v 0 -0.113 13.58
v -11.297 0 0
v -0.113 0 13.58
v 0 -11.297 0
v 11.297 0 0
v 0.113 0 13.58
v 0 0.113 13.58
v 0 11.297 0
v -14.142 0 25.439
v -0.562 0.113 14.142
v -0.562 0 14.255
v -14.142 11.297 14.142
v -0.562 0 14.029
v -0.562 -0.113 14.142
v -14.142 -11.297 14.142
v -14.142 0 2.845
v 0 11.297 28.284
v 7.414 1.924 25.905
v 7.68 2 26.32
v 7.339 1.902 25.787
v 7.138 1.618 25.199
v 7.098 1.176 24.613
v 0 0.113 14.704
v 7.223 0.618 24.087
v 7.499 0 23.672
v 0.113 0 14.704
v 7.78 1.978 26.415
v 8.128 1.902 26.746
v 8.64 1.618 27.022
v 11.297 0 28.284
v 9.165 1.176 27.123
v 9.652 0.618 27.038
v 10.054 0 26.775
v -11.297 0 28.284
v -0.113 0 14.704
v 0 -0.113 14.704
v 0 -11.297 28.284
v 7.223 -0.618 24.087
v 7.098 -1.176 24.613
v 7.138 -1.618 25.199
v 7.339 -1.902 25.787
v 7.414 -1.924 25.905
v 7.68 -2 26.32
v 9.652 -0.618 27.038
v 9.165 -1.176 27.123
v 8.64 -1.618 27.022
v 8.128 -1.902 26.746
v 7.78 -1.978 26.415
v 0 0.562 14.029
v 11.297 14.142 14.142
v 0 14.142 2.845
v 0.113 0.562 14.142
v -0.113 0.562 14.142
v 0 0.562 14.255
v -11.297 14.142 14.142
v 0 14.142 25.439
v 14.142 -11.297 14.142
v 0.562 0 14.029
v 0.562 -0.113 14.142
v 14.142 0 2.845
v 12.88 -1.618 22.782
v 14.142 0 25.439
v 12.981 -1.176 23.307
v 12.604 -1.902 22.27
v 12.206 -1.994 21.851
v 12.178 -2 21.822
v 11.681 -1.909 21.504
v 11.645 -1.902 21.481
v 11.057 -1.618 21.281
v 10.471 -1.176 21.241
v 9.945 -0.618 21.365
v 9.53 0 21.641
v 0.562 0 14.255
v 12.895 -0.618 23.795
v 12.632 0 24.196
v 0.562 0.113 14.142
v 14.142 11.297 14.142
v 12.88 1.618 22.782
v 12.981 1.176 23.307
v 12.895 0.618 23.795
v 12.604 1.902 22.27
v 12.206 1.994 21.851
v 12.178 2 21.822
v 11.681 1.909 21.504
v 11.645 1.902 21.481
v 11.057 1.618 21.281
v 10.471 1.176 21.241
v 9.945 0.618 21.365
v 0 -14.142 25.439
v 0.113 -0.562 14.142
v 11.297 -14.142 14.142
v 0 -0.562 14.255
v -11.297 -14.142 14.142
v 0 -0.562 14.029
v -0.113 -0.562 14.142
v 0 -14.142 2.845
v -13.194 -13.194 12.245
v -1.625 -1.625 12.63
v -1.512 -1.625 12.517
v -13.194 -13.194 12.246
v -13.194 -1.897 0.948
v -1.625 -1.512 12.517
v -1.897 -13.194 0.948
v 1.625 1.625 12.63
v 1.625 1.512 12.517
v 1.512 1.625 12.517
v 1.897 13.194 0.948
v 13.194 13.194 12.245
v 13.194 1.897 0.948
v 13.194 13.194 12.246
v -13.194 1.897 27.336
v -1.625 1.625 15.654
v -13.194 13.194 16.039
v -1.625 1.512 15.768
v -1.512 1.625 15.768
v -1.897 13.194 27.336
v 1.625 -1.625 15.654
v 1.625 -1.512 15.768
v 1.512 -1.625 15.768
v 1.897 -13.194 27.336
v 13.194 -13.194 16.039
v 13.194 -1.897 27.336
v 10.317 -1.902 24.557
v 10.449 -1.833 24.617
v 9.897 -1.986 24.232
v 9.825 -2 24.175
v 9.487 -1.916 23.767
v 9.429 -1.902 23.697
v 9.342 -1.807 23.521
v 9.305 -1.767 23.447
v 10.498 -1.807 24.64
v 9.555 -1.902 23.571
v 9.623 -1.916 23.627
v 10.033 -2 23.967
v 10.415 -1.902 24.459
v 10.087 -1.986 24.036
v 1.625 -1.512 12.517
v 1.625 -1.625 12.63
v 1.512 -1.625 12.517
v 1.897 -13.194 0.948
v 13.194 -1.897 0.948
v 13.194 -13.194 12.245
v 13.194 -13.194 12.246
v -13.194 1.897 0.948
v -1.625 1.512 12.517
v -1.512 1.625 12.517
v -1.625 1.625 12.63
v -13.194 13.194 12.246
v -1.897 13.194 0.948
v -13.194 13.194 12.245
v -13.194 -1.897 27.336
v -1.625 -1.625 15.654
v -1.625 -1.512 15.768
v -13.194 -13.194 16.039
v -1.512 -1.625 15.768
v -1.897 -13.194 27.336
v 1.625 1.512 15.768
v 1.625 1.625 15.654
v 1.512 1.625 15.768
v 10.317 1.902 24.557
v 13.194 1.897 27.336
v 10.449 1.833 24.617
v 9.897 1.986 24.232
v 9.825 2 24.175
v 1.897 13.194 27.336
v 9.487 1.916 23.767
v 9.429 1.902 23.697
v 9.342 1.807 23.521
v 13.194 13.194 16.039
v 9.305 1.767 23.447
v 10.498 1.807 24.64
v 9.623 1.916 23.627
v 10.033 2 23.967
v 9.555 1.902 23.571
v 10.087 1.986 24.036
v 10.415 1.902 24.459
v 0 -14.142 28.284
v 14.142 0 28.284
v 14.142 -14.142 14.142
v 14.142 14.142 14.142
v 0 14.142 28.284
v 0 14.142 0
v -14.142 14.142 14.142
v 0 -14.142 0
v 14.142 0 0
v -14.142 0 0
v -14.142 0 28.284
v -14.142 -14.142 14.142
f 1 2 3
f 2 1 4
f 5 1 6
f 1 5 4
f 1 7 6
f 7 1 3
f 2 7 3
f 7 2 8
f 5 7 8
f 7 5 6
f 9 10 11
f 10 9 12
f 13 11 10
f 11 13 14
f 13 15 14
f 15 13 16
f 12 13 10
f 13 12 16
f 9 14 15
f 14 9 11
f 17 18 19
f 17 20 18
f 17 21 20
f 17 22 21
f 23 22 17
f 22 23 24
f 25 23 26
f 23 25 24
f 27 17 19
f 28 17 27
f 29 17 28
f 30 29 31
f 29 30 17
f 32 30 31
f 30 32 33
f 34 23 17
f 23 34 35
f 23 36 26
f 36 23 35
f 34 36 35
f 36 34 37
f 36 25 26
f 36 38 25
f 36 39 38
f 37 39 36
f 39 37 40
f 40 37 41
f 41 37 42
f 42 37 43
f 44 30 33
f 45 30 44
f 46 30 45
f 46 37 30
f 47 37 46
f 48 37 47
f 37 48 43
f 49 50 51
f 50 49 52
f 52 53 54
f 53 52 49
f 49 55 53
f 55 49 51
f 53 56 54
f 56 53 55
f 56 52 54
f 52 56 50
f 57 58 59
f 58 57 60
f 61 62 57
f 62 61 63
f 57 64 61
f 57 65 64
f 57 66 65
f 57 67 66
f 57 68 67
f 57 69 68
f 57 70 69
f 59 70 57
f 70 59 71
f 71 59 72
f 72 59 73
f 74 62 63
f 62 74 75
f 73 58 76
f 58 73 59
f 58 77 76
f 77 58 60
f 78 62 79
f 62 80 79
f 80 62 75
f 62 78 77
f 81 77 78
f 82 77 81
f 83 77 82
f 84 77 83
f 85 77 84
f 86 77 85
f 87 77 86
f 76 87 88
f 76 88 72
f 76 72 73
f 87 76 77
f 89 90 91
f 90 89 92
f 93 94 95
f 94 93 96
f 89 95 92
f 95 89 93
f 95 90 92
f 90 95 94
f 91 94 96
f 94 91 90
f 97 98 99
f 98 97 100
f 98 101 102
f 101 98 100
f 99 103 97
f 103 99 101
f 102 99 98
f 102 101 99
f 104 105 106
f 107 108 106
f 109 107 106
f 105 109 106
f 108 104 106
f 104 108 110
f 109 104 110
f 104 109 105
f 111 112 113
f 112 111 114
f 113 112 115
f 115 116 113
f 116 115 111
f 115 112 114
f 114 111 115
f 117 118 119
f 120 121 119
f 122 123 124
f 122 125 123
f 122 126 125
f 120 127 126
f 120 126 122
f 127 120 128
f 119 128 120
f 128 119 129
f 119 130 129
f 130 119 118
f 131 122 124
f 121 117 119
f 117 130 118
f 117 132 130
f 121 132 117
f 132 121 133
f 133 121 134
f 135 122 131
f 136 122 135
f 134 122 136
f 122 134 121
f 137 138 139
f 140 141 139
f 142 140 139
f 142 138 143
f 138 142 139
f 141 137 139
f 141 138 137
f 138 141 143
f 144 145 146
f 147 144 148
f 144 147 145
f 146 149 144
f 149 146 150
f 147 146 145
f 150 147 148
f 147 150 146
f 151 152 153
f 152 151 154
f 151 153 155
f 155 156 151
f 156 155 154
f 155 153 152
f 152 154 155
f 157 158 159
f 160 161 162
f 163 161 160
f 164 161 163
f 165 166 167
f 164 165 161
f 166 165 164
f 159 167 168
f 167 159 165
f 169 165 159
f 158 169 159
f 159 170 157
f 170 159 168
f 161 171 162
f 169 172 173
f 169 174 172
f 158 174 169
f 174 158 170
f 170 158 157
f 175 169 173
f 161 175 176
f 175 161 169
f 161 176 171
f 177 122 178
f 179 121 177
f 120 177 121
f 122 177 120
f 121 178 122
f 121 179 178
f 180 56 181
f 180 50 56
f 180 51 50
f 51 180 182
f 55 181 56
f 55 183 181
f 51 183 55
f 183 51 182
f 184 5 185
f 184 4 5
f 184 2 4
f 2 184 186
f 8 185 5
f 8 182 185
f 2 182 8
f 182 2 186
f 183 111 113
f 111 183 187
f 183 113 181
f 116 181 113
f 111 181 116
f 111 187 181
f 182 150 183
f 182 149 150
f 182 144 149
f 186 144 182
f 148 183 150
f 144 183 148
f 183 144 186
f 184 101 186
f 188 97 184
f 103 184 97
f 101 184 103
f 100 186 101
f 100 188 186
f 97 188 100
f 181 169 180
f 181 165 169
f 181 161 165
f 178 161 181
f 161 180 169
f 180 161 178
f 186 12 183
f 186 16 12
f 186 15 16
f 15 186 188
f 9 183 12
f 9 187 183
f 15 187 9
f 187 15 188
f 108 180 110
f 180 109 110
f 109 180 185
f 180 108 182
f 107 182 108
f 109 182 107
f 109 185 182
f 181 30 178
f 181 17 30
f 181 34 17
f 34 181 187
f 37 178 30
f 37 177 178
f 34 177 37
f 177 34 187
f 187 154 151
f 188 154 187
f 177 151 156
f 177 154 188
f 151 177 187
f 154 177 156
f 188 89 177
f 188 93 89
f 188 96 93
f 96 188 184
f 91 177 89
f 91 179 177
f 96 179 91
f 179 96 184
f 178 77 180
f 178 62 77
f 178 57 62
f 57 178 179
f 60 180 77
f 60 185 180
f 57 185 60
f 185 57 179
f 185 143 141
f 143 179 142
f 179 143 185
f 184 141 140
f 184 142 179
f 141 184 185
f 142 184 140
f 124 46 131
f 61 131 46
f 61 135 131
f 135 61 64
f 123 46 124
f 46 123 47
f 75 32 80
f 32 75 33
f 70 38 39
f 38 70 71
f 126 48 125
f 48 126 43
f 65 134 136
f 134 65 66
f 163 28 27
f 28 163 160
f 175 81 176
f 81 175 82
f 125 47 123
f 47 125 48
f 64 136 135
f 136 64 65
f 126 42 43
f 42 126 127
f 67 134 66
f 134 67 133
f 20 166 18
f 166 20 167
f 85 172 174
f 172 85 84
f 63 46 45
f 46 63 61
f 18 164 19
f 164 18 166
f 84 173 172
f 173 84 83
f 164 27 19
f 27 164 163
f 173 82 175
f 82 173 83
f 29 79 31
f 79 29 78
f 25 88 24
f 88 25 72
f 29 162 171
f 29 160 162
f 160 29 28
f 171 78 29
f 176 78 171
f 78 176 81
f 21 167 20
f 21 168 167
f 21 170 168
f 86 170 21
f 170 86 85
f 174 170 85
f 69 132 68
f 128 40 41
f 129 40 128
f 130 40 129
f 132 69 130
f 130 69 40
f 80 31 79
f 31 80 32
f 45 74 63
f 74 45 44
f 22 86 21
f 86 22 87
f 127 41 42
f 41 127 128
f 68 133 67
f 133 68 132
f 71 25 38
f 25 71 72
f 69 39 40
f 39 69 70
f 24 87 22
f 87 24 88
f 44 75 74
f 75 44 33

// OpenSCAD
// Cuboctahedron savonnette

version = 1;
// Cuboctahedron

// base coordinates
// source:  http://dmccooey.com/polyhedra/Cuboctahedron.txt
// generated by  http://kitwallace.co.uk/3d/solid-to-scad.xq
Name = "Cuboctahedron";
// 4 sided faces = 6
// 3 sided faces = 8
C0 = 0.7071067811865475244008443621048;
points = [
[ C0, 0.0,  C0],
[ C0, 0.0, -C0],
[-C0, 0.0,  C0],
[-C0, 0.0, -C0],
[ C0,  C0, 0.0],
[ C0, -C0, 0.0],
[-C0,  C0, 0.0],
[-C0, -C0, 0.0],
[0.0,  C0,  C0],
[0.0,  C0, -C0],
[0.0, -C0,  C0],
[0.0, -C0, -C0]];
faces = [
[  4 ,  1,  5,  0],
[ 10 ,  2,  8,  0],
[  3 ,  6,  2,  7],
[ 10 ,  5, 11,  7],
[  3 , 11,  1,  9],
[  4 ,  8,  6,  9],
[  8 ,  4,  0],
[ 11 ,  5,  1],
[ 10 ,  7,  2],
[  9 ,  6,  3],
[  9 ,  1,  4],
[ 10 ,  0,  5],
[  8 ,  2,  6],
[ 11 ,  3,  7]];
edges = [
[1,4],
[1,5],
[0,5],
[0,4],
[2,10],
[2,8],
[0,8],
[0,10],
[3,6],
[2,6],
[2,7],
[3,7],
[5,10],
[5,11],
[7,11],
[7,10],
[3,11],
[1,11],
[1,9],
[3,9],
[4,8],
[6,8],
[6,9],
[4,9]];

dihedralAngle = 125.264;
// ---------------------------------

////// "savonnette"
savonnette = 1;
// cut holes out of shell
eps=0.02;
radius=20;
shell_ratio=0.8; // 0.1
prism_base_ratio =0.8;
prism_height_ratio=0.68; // 0.3
prism_scale=0.01; // 0.3
nfaces = [];
scale=1;
//////

// cut holes out of shell
// eps=0.02;
// // radius=20;
// shell_ratio=0.1;
// prism_base_ratio =0.8;
// prism_height_ratio=0.3;
// prism_scale=0.3;
// nfaces = [];
// scale=1;

avec_trou();

module avec_trou() {
    difference() {
        cuboctahedron(radius);
        translate([radius*0.7, 0, radius]) rotate([0,-45])
            cylinder(h=2*radius, r=2, center=false, $fn=20);
    }

}

module cuboctahedron(radius, wireframe=false) {
  //insert
  spoints = normalize(centre_points(points),radius);
  sfaces = lhs_faces(faces,spoints);
  cfaces = select_nsided_faces(sfaces,nfaces);

  module shape() {
     difference() {
        polyhedron(spoints,sfaces);
        if (!savonnette) {
          scale(1-shell_ratio) polyhedron(spoints,sfaces);
        }
       face_prisms_in(cfaces,spoints,prism_base_ratio,prism_scale,prism_height_ratio);
     }
  }

  scale(scale)
   place_on_largest_face(sfaces,spoints)
     shape();
}


/////////////////////////////
// Vector Equilibrium axis //
/////////////////////////////

module VE_axis(radius, thickness=4, fn=33) {
  h = 2*radius-8;
  r = thickness/2;
  $fn = fn;
  translate([0,0,radius*sqrt(2)/2]) {
    rotate([45])
      cylinder(h=h, r=r, center=true);
    rotate([-45])
      cylinder(h=h, r=r, center=true);
    rotate([0,45])
      cylinder(h=h, r=r, center=true);
    rotate([0,-45])
      cylinder(h=h, r=r, center=true);
    rotate([90,0,45])
      cylinder(h=h, r=r, center=true);
    rotate([90,0,-45])
      cylinder(h=h, r=r, center=true);
  }
}




/////////////////////////////
/////////////////////////////

// ruler(10);

// functions for the construction of polyhedra
// chris wallace
// see http://kitwallace.tumblr.com/tagged/polyhedra for info


//  functions for creating the matrices for transforming a single point

function m_translate(v) = [ [1, 0, 0, 0],
                            [0, 1, 0, 0],
                            [0, 0, 1, 0],
                            [v.x, v.y, v.z, 1  ] ];

function m_rotate(v) =  [ [1,  0,         0,        0],
                          [0,  cos(v.x),  sin(v.x), 0],
                          [0, -sin(v.x),  cos(v.x), 0],
                          [0,  0,         0,        1] ]
                      * [ [ cos(v.y), 0,  -sin(v.y), 0],
                          [0,         1,  0,        0],
                          [ sin(v.y), 0,  cos(v.y), 0],
                          [0,         0,  0,        1] ]
                      * [ [ cos(v.z),  sin(v.z), 0, 0],
                          [-sin(v.z),  cos(v.z), 0, 0],
                          [ 0,         0,        1, 0],
                          [ 0,         0,        0, 1] ];

function vec3(v) = [v.x, v.y, v.z];
function transform(v, m)  = vec3([v.x, v.y, v.z, 1] * m);

function matrix_to(p0, p) =
                       m_rotate([0, atan2(sqrt(pow(p[0], 2) + pow(p[1], 2)), p[2]), 0])
                     * m_rotate([0, 0, atan2(p[1], p[0])])
                     * m_translate(p0);

function matrix_from(p0, p) =
                      m_translate(-p0)
                      * m_rotate([0, 0, -atan2(p[1], p[0])])
                      * m_rotate([0, -atan2(sqrt(pow(p[0], 2) + pow(p[1], 2)), p[2]), 0]);

function transform_points(list, matrix, i = 0) =
    i < len(list)
       ? concat([ transform(list[i], matrix) ], transform_points(list, matrix, i + 1))
       : [];


//  convert from point indexes to point coordinates

function as_points(indexes,points,i=0) =
     i < len(indexes)
        ?  concat([points[indexes[i]]], as_points(indexes,points,i+1))
        : [];

//  basic vector functions
function normal_r(face) =
     cross(face[1]-face[0],face[2]-face[0]);

function normal(face) =
     - normal_r(face) / norm(normal_r(face));

function centre(points) =
      vsum(points) / len(points);

// sum a list of vectors
function vsum(points,i=0) =
      i < len(points)
        ?  (points[i] + vsum(points,i+1))
        :  [0,0,0];

function ssum(list,i=0) =
      i < len(list)
        ?  (list[i] + ssum(list,i+1))
        :  0;


// add a vector to a list of vectors
function vadd(points,v,i=0) =
      i < len(points)
        ?  concat([points[i] + v], vadd(points,v,i+1))
        :  [];

function reverse_r(v,n) =
      n == 0
        ? [v[0]]
        : concat([v[n]],reverse_r(v,n-1));

function reverse(v) = reverse_r(v, len(v)-1);

function sum_norm(points,i=0) =
    i < len(points)
       ?  norm(points[i]) + sum_norm(points,i+1)
       : 0 ;

function average_radius(points) =
       sum_norm(points) / len(points);


// select one dimension of a list of vectors
function slice(v,k,i=0) =
   i <len(v)
      ?  concat([v[i][k]], slice(v,k,i+1))
      : [];

function max(v, max=-9999999999999999,i=0) =
     i < len(v)
        ?  v[i] > max
            ?  max(v, v[i], i+1 )
            :  max(v, max, i+1 )
        : max;

function min(v, min=9999999999999999,i=0) =
     i < len(v)
        ?  v[i] < min
            ?  min(v, v[i], i+1 )
            :  min(v, min, i+1 )
        : min;

function project(pts,i=0) =
     i < len(pts)
        ? concat([[pts[i][0],pts[i][1]]], project(pts,i+1))
        : [];

function contains(n, list, i=0) =
     i < len(list)
        ?  n == list[i]
           ?  true
           :  contains(n,list,i+1)
        : false;

// normalize the points to have origin at 0,0,0
function centre_points(points) =
     vadd(points, - centre(points));

//scale to average radius = radius
function normalize(points,radius) =
    points * radius /average_radius(points);

function select_nsided_faces(faces,nsides,i=0) =
  len(nsides) == 0
     ?  faces
     :  i < len(faces)
         ?  contains(len(faces[i]), nsides)
             ? concat([faces[i]],  select_nsided_faces(faces,nsides,i+1))
             : select_nsided_faces(faces,nsides,i+1)
         : [];

function longest_edge(face,max=-1,i=0) =
       i < len(face)
          ?  norm(face[i] - face[(i+1)% len(face)]) > max
             ?  longest_edge(face, norm(face[i] - face[(i+1)% len(face)]),i+1)
             :  longest_edge(face, max,i+1)
          : max ;

function point_edges(point,edges,i=0) =
    i < len(edges)
       ? point == edges[i][0] || point == edges[i][1]
         ? concat([edges[i]], point_edges(point,edges,i+1))
         : point_edges(point,edges,i+1)
       : [];

function select_nedged_points(points,edges,nedges,i=0) =
     i < len(points)
         ?  len(point_edges(i,edges)) == nedges
             ? concat([i],  select_nedged_points(points,edges,nedges,i+1))
             : select_nedged_points(points,edges,nedges,i+1)
         : [];

function triangle(a,b) = norm(cross(a,b))/2;

function face_area_centre(face,centre,i=0) =
    i < len(face)
       ?  triangle(
                face[i] - centre,
                face[(i+1) % len(face)] - centre)
          + face_area_centre(face,centre,i+1)
       : 0 ;

function face_area(face) = face_area_centre(face,centre(face));

function face_areas(faces,points,i=0) =
   i < len(faces)
      ? concat([[i,  face_area(as_points(faces[i],points))]] ,
               face_areas(faces,points,i+1))
      : [] ;

function max_area(areas, max=[-1,-1], i=0) =
   i <len(areas)
      ? areas[i][1] > max[1]
         ?  max_area(areas,areas[i],i+1)
         :  max_area(areas,max,i+1)
      : max;


function bbox(v) = [
   [min(slice(spoints,0)), max(slice(spoints,0))],
   [min(slice(spoints,1)), max(slice(spoints,1))],
   [min(slice(spoints,2)), max(slice(spoints,2))]
];

// check that all faces have a lhs orientation
function cosine_between(u, v) =(u * v) / (norm(u) * norm(v));

function lhs_faces(faces,points,i=0) =
     i < len(faces)
        ?  cosine_between(normal(as_points(faces[i],points)),
                         centre(as_points(faces[i],points))) < 0
            ?  concat([reverse(faces[i])],lhs_faces(faces,points,i+1))
            :  concat([faces[i]],lhs_faces(faces,points,i+1))
        : [] ;


function fs(p) = f(p[0],p[1],p[2]);

function modulate_point(p) =
    spherical_to_xyz(fs(xyz_to_spherical(p)));

function modulate_points(points,i=0) =
   i < len(points)
      ? concat([modulate_point(points[i])],modulate_points(points,i+1))
      : [];

function xyz_to_spherical(p) =
    [ norm(p), acos(p.z/ norm(p)), atan2(p.x,p.y)] ;

function spherical_to_xyz_full(r,theta,phi) =
    [ r * sin(theta) * cos(phi),
      r * sin(theta) * sin(phi),
      r * cos(theta)];

function spherical_to_xyz(s) =
     spherical_to_xyz_full(s[0],s[1],s[2]);

function select_large_faces(faces,points, min,i=0) =
  i < len(faces)
     ?  face_area(as_points(faces[i],points)) > min
       ? concat([faces[i]],  select_large_faces(faces,points,min,i+1))
       :select_large_faces(faces,points,min,i+1)
     : [];

function lower(char) =
    contains(char,"abcdefghijklmnopqrstuvwxyz") ;

function char_layer(char) =
    lower(char)
         ? str(char,"_")
         : char;

module write_char(font,char) {
    linear_extrude(height=1,convexity=10)
      import(file=str("write/",font,".dxf"),layer=char_layer(char));
};

module write_centred_char(font,char) {
    linear_extrude(height=1,convexity=10)
      translate([-2.5,-4,0])
          import(file=str("write/",font,".dxf"),layer=char_layer(char));
};
module engrave_face_word(faces,points,word,font,ratio,thickness) {
    for (i=[0:len(faces) - 1])
      if (i <len(word))
        assign (f = as_points(faces[i],points))
        assign (n = normal(f), c = centre(f))
        assign(s = longest_edge(f) / 20* ratio)
           orient_to(c,n)
                translate([0,0,-thickness+eps])
                     scale([s,s,thickness])
                          write_centred_char(font,word[i]);
}

module orient_to(centre, normal) {
      translate(centre)
      rotate([0, 0, atan2(normal[1], normal[0])]) //rotation
      rotate([0, atan2(sqrt(pow(normal[0], 2)+pow(normal[1], 2)),normal[2]), 0])
      children();
}

module orient_from(centre, normal) {
      rotate([0, -atan2(sqrt(pow(normal[0], 2)+pow(normal[1], 2)),normal[2]), 0])
      rotate([0, 0, -atan2(normal[1], normal[0])]) //rotation
      translate(-centre)
      children();
}

module place_on_largest_face(faces,points) {
  assign (largest = max_area(face_areas(faces,points)))
  assign (lpoints = as_points(faces[largest[0]],points))
  assign (n = normal(lpoints),c = centre(lpoints))
  orient_from(c,-n)
  children();
}

module make_edge(edge, points, r) {
    assign(p0 = points[edge[0]], p1 = points[edge[1]])
    assign(v = p1 -p0 )
     orient_to(p0,v)
       cylinder(r=r, h=norm(v));
}

module make_edges(points, edges, r) {
   for (i =[0:len(edges)-1])
      make_edge(edges[i],points, r);
}

module make_vertices(points,r) {
   for (i = [0:len(points)-1])
      translate(points[i]) sphere(r);
}

module face_prism (face,prism_base_ratio,prism_scale,prism_height_ratio) {
    assign (n = normal(face), c= centre(face))
    assign (m = matrix_from(c,n))
    assign (tpts =  prism_base_ratio * transform_points(face,m))
    assign (max_length = longest_edge(face))
    assign (xy = project(tpts))
      linear_extrude(height=prism_height_ratio * max_length, scale=prism_scale)
          polygon(points=xy);
}

module face_prisms_in(faces,points,prism_base_ratio,prism_scale,prism_height_ratio) {
    for (i=[0:len(faces) - 1])
       assign (f = as_points(faces[i],points))
       assign (n = normal(f), c = centre(f))
       orient_to(c,n)
          translate([0,0,eps])
               mirror() rotate([0,180,0])
                   face_prism(f,prism_base_ratio,prism_scale,prism_height_ratio);
}

module face_prisms_out(faces,points,prism_base_ratio,prism_scale,prism_height_ratio) {
    for (i=[0:len(faces) - 1])
       assign (f = as_points(faces[i],points))
       assign (n = normal(f), c = centre(f))
       orient_to(c,n)
          translate([0,0,-eps])
               face_prism(f,prism_base_ratio,prism_scale,prism_height_ratio);
}

module face_prisms_through(faces,points,prism_base_ratio,prism_scale,prism_height_ratio) {
    for (i=[0:len(faces) - 1])
       assign (f = as_points(faces[i],points))
       assign (n = normal(f), c = centre(f))
       orient_to(c,n)
          translate([0,0,prism_height_ratio*longest_edge(f)/2])
               mirror() rotate([0,180,0])
                   face_prism(f,prism_base_ratio,prism_scale,prism_height_ratio);
}
module ruler(n) {
   for (i=[0:n-1])
       translate([(i-n/2 +0.5)* 10,0,0]) cube([9.8,5,2], center=true);
}

module ground(size=50) {
   translate([0,0,-size]) cube(2*size,center=true);
}

module cross_section(size=50) {
   translate([0,0,-size]) cube(2*size);
}

module ring(radius,thickness,height) {
   difference() {
      cylinder(h=height,r=radius);
      translate([0,0,-eps]) cylinder(h=height+2*eps,r=radius - thickness);
   }
}
